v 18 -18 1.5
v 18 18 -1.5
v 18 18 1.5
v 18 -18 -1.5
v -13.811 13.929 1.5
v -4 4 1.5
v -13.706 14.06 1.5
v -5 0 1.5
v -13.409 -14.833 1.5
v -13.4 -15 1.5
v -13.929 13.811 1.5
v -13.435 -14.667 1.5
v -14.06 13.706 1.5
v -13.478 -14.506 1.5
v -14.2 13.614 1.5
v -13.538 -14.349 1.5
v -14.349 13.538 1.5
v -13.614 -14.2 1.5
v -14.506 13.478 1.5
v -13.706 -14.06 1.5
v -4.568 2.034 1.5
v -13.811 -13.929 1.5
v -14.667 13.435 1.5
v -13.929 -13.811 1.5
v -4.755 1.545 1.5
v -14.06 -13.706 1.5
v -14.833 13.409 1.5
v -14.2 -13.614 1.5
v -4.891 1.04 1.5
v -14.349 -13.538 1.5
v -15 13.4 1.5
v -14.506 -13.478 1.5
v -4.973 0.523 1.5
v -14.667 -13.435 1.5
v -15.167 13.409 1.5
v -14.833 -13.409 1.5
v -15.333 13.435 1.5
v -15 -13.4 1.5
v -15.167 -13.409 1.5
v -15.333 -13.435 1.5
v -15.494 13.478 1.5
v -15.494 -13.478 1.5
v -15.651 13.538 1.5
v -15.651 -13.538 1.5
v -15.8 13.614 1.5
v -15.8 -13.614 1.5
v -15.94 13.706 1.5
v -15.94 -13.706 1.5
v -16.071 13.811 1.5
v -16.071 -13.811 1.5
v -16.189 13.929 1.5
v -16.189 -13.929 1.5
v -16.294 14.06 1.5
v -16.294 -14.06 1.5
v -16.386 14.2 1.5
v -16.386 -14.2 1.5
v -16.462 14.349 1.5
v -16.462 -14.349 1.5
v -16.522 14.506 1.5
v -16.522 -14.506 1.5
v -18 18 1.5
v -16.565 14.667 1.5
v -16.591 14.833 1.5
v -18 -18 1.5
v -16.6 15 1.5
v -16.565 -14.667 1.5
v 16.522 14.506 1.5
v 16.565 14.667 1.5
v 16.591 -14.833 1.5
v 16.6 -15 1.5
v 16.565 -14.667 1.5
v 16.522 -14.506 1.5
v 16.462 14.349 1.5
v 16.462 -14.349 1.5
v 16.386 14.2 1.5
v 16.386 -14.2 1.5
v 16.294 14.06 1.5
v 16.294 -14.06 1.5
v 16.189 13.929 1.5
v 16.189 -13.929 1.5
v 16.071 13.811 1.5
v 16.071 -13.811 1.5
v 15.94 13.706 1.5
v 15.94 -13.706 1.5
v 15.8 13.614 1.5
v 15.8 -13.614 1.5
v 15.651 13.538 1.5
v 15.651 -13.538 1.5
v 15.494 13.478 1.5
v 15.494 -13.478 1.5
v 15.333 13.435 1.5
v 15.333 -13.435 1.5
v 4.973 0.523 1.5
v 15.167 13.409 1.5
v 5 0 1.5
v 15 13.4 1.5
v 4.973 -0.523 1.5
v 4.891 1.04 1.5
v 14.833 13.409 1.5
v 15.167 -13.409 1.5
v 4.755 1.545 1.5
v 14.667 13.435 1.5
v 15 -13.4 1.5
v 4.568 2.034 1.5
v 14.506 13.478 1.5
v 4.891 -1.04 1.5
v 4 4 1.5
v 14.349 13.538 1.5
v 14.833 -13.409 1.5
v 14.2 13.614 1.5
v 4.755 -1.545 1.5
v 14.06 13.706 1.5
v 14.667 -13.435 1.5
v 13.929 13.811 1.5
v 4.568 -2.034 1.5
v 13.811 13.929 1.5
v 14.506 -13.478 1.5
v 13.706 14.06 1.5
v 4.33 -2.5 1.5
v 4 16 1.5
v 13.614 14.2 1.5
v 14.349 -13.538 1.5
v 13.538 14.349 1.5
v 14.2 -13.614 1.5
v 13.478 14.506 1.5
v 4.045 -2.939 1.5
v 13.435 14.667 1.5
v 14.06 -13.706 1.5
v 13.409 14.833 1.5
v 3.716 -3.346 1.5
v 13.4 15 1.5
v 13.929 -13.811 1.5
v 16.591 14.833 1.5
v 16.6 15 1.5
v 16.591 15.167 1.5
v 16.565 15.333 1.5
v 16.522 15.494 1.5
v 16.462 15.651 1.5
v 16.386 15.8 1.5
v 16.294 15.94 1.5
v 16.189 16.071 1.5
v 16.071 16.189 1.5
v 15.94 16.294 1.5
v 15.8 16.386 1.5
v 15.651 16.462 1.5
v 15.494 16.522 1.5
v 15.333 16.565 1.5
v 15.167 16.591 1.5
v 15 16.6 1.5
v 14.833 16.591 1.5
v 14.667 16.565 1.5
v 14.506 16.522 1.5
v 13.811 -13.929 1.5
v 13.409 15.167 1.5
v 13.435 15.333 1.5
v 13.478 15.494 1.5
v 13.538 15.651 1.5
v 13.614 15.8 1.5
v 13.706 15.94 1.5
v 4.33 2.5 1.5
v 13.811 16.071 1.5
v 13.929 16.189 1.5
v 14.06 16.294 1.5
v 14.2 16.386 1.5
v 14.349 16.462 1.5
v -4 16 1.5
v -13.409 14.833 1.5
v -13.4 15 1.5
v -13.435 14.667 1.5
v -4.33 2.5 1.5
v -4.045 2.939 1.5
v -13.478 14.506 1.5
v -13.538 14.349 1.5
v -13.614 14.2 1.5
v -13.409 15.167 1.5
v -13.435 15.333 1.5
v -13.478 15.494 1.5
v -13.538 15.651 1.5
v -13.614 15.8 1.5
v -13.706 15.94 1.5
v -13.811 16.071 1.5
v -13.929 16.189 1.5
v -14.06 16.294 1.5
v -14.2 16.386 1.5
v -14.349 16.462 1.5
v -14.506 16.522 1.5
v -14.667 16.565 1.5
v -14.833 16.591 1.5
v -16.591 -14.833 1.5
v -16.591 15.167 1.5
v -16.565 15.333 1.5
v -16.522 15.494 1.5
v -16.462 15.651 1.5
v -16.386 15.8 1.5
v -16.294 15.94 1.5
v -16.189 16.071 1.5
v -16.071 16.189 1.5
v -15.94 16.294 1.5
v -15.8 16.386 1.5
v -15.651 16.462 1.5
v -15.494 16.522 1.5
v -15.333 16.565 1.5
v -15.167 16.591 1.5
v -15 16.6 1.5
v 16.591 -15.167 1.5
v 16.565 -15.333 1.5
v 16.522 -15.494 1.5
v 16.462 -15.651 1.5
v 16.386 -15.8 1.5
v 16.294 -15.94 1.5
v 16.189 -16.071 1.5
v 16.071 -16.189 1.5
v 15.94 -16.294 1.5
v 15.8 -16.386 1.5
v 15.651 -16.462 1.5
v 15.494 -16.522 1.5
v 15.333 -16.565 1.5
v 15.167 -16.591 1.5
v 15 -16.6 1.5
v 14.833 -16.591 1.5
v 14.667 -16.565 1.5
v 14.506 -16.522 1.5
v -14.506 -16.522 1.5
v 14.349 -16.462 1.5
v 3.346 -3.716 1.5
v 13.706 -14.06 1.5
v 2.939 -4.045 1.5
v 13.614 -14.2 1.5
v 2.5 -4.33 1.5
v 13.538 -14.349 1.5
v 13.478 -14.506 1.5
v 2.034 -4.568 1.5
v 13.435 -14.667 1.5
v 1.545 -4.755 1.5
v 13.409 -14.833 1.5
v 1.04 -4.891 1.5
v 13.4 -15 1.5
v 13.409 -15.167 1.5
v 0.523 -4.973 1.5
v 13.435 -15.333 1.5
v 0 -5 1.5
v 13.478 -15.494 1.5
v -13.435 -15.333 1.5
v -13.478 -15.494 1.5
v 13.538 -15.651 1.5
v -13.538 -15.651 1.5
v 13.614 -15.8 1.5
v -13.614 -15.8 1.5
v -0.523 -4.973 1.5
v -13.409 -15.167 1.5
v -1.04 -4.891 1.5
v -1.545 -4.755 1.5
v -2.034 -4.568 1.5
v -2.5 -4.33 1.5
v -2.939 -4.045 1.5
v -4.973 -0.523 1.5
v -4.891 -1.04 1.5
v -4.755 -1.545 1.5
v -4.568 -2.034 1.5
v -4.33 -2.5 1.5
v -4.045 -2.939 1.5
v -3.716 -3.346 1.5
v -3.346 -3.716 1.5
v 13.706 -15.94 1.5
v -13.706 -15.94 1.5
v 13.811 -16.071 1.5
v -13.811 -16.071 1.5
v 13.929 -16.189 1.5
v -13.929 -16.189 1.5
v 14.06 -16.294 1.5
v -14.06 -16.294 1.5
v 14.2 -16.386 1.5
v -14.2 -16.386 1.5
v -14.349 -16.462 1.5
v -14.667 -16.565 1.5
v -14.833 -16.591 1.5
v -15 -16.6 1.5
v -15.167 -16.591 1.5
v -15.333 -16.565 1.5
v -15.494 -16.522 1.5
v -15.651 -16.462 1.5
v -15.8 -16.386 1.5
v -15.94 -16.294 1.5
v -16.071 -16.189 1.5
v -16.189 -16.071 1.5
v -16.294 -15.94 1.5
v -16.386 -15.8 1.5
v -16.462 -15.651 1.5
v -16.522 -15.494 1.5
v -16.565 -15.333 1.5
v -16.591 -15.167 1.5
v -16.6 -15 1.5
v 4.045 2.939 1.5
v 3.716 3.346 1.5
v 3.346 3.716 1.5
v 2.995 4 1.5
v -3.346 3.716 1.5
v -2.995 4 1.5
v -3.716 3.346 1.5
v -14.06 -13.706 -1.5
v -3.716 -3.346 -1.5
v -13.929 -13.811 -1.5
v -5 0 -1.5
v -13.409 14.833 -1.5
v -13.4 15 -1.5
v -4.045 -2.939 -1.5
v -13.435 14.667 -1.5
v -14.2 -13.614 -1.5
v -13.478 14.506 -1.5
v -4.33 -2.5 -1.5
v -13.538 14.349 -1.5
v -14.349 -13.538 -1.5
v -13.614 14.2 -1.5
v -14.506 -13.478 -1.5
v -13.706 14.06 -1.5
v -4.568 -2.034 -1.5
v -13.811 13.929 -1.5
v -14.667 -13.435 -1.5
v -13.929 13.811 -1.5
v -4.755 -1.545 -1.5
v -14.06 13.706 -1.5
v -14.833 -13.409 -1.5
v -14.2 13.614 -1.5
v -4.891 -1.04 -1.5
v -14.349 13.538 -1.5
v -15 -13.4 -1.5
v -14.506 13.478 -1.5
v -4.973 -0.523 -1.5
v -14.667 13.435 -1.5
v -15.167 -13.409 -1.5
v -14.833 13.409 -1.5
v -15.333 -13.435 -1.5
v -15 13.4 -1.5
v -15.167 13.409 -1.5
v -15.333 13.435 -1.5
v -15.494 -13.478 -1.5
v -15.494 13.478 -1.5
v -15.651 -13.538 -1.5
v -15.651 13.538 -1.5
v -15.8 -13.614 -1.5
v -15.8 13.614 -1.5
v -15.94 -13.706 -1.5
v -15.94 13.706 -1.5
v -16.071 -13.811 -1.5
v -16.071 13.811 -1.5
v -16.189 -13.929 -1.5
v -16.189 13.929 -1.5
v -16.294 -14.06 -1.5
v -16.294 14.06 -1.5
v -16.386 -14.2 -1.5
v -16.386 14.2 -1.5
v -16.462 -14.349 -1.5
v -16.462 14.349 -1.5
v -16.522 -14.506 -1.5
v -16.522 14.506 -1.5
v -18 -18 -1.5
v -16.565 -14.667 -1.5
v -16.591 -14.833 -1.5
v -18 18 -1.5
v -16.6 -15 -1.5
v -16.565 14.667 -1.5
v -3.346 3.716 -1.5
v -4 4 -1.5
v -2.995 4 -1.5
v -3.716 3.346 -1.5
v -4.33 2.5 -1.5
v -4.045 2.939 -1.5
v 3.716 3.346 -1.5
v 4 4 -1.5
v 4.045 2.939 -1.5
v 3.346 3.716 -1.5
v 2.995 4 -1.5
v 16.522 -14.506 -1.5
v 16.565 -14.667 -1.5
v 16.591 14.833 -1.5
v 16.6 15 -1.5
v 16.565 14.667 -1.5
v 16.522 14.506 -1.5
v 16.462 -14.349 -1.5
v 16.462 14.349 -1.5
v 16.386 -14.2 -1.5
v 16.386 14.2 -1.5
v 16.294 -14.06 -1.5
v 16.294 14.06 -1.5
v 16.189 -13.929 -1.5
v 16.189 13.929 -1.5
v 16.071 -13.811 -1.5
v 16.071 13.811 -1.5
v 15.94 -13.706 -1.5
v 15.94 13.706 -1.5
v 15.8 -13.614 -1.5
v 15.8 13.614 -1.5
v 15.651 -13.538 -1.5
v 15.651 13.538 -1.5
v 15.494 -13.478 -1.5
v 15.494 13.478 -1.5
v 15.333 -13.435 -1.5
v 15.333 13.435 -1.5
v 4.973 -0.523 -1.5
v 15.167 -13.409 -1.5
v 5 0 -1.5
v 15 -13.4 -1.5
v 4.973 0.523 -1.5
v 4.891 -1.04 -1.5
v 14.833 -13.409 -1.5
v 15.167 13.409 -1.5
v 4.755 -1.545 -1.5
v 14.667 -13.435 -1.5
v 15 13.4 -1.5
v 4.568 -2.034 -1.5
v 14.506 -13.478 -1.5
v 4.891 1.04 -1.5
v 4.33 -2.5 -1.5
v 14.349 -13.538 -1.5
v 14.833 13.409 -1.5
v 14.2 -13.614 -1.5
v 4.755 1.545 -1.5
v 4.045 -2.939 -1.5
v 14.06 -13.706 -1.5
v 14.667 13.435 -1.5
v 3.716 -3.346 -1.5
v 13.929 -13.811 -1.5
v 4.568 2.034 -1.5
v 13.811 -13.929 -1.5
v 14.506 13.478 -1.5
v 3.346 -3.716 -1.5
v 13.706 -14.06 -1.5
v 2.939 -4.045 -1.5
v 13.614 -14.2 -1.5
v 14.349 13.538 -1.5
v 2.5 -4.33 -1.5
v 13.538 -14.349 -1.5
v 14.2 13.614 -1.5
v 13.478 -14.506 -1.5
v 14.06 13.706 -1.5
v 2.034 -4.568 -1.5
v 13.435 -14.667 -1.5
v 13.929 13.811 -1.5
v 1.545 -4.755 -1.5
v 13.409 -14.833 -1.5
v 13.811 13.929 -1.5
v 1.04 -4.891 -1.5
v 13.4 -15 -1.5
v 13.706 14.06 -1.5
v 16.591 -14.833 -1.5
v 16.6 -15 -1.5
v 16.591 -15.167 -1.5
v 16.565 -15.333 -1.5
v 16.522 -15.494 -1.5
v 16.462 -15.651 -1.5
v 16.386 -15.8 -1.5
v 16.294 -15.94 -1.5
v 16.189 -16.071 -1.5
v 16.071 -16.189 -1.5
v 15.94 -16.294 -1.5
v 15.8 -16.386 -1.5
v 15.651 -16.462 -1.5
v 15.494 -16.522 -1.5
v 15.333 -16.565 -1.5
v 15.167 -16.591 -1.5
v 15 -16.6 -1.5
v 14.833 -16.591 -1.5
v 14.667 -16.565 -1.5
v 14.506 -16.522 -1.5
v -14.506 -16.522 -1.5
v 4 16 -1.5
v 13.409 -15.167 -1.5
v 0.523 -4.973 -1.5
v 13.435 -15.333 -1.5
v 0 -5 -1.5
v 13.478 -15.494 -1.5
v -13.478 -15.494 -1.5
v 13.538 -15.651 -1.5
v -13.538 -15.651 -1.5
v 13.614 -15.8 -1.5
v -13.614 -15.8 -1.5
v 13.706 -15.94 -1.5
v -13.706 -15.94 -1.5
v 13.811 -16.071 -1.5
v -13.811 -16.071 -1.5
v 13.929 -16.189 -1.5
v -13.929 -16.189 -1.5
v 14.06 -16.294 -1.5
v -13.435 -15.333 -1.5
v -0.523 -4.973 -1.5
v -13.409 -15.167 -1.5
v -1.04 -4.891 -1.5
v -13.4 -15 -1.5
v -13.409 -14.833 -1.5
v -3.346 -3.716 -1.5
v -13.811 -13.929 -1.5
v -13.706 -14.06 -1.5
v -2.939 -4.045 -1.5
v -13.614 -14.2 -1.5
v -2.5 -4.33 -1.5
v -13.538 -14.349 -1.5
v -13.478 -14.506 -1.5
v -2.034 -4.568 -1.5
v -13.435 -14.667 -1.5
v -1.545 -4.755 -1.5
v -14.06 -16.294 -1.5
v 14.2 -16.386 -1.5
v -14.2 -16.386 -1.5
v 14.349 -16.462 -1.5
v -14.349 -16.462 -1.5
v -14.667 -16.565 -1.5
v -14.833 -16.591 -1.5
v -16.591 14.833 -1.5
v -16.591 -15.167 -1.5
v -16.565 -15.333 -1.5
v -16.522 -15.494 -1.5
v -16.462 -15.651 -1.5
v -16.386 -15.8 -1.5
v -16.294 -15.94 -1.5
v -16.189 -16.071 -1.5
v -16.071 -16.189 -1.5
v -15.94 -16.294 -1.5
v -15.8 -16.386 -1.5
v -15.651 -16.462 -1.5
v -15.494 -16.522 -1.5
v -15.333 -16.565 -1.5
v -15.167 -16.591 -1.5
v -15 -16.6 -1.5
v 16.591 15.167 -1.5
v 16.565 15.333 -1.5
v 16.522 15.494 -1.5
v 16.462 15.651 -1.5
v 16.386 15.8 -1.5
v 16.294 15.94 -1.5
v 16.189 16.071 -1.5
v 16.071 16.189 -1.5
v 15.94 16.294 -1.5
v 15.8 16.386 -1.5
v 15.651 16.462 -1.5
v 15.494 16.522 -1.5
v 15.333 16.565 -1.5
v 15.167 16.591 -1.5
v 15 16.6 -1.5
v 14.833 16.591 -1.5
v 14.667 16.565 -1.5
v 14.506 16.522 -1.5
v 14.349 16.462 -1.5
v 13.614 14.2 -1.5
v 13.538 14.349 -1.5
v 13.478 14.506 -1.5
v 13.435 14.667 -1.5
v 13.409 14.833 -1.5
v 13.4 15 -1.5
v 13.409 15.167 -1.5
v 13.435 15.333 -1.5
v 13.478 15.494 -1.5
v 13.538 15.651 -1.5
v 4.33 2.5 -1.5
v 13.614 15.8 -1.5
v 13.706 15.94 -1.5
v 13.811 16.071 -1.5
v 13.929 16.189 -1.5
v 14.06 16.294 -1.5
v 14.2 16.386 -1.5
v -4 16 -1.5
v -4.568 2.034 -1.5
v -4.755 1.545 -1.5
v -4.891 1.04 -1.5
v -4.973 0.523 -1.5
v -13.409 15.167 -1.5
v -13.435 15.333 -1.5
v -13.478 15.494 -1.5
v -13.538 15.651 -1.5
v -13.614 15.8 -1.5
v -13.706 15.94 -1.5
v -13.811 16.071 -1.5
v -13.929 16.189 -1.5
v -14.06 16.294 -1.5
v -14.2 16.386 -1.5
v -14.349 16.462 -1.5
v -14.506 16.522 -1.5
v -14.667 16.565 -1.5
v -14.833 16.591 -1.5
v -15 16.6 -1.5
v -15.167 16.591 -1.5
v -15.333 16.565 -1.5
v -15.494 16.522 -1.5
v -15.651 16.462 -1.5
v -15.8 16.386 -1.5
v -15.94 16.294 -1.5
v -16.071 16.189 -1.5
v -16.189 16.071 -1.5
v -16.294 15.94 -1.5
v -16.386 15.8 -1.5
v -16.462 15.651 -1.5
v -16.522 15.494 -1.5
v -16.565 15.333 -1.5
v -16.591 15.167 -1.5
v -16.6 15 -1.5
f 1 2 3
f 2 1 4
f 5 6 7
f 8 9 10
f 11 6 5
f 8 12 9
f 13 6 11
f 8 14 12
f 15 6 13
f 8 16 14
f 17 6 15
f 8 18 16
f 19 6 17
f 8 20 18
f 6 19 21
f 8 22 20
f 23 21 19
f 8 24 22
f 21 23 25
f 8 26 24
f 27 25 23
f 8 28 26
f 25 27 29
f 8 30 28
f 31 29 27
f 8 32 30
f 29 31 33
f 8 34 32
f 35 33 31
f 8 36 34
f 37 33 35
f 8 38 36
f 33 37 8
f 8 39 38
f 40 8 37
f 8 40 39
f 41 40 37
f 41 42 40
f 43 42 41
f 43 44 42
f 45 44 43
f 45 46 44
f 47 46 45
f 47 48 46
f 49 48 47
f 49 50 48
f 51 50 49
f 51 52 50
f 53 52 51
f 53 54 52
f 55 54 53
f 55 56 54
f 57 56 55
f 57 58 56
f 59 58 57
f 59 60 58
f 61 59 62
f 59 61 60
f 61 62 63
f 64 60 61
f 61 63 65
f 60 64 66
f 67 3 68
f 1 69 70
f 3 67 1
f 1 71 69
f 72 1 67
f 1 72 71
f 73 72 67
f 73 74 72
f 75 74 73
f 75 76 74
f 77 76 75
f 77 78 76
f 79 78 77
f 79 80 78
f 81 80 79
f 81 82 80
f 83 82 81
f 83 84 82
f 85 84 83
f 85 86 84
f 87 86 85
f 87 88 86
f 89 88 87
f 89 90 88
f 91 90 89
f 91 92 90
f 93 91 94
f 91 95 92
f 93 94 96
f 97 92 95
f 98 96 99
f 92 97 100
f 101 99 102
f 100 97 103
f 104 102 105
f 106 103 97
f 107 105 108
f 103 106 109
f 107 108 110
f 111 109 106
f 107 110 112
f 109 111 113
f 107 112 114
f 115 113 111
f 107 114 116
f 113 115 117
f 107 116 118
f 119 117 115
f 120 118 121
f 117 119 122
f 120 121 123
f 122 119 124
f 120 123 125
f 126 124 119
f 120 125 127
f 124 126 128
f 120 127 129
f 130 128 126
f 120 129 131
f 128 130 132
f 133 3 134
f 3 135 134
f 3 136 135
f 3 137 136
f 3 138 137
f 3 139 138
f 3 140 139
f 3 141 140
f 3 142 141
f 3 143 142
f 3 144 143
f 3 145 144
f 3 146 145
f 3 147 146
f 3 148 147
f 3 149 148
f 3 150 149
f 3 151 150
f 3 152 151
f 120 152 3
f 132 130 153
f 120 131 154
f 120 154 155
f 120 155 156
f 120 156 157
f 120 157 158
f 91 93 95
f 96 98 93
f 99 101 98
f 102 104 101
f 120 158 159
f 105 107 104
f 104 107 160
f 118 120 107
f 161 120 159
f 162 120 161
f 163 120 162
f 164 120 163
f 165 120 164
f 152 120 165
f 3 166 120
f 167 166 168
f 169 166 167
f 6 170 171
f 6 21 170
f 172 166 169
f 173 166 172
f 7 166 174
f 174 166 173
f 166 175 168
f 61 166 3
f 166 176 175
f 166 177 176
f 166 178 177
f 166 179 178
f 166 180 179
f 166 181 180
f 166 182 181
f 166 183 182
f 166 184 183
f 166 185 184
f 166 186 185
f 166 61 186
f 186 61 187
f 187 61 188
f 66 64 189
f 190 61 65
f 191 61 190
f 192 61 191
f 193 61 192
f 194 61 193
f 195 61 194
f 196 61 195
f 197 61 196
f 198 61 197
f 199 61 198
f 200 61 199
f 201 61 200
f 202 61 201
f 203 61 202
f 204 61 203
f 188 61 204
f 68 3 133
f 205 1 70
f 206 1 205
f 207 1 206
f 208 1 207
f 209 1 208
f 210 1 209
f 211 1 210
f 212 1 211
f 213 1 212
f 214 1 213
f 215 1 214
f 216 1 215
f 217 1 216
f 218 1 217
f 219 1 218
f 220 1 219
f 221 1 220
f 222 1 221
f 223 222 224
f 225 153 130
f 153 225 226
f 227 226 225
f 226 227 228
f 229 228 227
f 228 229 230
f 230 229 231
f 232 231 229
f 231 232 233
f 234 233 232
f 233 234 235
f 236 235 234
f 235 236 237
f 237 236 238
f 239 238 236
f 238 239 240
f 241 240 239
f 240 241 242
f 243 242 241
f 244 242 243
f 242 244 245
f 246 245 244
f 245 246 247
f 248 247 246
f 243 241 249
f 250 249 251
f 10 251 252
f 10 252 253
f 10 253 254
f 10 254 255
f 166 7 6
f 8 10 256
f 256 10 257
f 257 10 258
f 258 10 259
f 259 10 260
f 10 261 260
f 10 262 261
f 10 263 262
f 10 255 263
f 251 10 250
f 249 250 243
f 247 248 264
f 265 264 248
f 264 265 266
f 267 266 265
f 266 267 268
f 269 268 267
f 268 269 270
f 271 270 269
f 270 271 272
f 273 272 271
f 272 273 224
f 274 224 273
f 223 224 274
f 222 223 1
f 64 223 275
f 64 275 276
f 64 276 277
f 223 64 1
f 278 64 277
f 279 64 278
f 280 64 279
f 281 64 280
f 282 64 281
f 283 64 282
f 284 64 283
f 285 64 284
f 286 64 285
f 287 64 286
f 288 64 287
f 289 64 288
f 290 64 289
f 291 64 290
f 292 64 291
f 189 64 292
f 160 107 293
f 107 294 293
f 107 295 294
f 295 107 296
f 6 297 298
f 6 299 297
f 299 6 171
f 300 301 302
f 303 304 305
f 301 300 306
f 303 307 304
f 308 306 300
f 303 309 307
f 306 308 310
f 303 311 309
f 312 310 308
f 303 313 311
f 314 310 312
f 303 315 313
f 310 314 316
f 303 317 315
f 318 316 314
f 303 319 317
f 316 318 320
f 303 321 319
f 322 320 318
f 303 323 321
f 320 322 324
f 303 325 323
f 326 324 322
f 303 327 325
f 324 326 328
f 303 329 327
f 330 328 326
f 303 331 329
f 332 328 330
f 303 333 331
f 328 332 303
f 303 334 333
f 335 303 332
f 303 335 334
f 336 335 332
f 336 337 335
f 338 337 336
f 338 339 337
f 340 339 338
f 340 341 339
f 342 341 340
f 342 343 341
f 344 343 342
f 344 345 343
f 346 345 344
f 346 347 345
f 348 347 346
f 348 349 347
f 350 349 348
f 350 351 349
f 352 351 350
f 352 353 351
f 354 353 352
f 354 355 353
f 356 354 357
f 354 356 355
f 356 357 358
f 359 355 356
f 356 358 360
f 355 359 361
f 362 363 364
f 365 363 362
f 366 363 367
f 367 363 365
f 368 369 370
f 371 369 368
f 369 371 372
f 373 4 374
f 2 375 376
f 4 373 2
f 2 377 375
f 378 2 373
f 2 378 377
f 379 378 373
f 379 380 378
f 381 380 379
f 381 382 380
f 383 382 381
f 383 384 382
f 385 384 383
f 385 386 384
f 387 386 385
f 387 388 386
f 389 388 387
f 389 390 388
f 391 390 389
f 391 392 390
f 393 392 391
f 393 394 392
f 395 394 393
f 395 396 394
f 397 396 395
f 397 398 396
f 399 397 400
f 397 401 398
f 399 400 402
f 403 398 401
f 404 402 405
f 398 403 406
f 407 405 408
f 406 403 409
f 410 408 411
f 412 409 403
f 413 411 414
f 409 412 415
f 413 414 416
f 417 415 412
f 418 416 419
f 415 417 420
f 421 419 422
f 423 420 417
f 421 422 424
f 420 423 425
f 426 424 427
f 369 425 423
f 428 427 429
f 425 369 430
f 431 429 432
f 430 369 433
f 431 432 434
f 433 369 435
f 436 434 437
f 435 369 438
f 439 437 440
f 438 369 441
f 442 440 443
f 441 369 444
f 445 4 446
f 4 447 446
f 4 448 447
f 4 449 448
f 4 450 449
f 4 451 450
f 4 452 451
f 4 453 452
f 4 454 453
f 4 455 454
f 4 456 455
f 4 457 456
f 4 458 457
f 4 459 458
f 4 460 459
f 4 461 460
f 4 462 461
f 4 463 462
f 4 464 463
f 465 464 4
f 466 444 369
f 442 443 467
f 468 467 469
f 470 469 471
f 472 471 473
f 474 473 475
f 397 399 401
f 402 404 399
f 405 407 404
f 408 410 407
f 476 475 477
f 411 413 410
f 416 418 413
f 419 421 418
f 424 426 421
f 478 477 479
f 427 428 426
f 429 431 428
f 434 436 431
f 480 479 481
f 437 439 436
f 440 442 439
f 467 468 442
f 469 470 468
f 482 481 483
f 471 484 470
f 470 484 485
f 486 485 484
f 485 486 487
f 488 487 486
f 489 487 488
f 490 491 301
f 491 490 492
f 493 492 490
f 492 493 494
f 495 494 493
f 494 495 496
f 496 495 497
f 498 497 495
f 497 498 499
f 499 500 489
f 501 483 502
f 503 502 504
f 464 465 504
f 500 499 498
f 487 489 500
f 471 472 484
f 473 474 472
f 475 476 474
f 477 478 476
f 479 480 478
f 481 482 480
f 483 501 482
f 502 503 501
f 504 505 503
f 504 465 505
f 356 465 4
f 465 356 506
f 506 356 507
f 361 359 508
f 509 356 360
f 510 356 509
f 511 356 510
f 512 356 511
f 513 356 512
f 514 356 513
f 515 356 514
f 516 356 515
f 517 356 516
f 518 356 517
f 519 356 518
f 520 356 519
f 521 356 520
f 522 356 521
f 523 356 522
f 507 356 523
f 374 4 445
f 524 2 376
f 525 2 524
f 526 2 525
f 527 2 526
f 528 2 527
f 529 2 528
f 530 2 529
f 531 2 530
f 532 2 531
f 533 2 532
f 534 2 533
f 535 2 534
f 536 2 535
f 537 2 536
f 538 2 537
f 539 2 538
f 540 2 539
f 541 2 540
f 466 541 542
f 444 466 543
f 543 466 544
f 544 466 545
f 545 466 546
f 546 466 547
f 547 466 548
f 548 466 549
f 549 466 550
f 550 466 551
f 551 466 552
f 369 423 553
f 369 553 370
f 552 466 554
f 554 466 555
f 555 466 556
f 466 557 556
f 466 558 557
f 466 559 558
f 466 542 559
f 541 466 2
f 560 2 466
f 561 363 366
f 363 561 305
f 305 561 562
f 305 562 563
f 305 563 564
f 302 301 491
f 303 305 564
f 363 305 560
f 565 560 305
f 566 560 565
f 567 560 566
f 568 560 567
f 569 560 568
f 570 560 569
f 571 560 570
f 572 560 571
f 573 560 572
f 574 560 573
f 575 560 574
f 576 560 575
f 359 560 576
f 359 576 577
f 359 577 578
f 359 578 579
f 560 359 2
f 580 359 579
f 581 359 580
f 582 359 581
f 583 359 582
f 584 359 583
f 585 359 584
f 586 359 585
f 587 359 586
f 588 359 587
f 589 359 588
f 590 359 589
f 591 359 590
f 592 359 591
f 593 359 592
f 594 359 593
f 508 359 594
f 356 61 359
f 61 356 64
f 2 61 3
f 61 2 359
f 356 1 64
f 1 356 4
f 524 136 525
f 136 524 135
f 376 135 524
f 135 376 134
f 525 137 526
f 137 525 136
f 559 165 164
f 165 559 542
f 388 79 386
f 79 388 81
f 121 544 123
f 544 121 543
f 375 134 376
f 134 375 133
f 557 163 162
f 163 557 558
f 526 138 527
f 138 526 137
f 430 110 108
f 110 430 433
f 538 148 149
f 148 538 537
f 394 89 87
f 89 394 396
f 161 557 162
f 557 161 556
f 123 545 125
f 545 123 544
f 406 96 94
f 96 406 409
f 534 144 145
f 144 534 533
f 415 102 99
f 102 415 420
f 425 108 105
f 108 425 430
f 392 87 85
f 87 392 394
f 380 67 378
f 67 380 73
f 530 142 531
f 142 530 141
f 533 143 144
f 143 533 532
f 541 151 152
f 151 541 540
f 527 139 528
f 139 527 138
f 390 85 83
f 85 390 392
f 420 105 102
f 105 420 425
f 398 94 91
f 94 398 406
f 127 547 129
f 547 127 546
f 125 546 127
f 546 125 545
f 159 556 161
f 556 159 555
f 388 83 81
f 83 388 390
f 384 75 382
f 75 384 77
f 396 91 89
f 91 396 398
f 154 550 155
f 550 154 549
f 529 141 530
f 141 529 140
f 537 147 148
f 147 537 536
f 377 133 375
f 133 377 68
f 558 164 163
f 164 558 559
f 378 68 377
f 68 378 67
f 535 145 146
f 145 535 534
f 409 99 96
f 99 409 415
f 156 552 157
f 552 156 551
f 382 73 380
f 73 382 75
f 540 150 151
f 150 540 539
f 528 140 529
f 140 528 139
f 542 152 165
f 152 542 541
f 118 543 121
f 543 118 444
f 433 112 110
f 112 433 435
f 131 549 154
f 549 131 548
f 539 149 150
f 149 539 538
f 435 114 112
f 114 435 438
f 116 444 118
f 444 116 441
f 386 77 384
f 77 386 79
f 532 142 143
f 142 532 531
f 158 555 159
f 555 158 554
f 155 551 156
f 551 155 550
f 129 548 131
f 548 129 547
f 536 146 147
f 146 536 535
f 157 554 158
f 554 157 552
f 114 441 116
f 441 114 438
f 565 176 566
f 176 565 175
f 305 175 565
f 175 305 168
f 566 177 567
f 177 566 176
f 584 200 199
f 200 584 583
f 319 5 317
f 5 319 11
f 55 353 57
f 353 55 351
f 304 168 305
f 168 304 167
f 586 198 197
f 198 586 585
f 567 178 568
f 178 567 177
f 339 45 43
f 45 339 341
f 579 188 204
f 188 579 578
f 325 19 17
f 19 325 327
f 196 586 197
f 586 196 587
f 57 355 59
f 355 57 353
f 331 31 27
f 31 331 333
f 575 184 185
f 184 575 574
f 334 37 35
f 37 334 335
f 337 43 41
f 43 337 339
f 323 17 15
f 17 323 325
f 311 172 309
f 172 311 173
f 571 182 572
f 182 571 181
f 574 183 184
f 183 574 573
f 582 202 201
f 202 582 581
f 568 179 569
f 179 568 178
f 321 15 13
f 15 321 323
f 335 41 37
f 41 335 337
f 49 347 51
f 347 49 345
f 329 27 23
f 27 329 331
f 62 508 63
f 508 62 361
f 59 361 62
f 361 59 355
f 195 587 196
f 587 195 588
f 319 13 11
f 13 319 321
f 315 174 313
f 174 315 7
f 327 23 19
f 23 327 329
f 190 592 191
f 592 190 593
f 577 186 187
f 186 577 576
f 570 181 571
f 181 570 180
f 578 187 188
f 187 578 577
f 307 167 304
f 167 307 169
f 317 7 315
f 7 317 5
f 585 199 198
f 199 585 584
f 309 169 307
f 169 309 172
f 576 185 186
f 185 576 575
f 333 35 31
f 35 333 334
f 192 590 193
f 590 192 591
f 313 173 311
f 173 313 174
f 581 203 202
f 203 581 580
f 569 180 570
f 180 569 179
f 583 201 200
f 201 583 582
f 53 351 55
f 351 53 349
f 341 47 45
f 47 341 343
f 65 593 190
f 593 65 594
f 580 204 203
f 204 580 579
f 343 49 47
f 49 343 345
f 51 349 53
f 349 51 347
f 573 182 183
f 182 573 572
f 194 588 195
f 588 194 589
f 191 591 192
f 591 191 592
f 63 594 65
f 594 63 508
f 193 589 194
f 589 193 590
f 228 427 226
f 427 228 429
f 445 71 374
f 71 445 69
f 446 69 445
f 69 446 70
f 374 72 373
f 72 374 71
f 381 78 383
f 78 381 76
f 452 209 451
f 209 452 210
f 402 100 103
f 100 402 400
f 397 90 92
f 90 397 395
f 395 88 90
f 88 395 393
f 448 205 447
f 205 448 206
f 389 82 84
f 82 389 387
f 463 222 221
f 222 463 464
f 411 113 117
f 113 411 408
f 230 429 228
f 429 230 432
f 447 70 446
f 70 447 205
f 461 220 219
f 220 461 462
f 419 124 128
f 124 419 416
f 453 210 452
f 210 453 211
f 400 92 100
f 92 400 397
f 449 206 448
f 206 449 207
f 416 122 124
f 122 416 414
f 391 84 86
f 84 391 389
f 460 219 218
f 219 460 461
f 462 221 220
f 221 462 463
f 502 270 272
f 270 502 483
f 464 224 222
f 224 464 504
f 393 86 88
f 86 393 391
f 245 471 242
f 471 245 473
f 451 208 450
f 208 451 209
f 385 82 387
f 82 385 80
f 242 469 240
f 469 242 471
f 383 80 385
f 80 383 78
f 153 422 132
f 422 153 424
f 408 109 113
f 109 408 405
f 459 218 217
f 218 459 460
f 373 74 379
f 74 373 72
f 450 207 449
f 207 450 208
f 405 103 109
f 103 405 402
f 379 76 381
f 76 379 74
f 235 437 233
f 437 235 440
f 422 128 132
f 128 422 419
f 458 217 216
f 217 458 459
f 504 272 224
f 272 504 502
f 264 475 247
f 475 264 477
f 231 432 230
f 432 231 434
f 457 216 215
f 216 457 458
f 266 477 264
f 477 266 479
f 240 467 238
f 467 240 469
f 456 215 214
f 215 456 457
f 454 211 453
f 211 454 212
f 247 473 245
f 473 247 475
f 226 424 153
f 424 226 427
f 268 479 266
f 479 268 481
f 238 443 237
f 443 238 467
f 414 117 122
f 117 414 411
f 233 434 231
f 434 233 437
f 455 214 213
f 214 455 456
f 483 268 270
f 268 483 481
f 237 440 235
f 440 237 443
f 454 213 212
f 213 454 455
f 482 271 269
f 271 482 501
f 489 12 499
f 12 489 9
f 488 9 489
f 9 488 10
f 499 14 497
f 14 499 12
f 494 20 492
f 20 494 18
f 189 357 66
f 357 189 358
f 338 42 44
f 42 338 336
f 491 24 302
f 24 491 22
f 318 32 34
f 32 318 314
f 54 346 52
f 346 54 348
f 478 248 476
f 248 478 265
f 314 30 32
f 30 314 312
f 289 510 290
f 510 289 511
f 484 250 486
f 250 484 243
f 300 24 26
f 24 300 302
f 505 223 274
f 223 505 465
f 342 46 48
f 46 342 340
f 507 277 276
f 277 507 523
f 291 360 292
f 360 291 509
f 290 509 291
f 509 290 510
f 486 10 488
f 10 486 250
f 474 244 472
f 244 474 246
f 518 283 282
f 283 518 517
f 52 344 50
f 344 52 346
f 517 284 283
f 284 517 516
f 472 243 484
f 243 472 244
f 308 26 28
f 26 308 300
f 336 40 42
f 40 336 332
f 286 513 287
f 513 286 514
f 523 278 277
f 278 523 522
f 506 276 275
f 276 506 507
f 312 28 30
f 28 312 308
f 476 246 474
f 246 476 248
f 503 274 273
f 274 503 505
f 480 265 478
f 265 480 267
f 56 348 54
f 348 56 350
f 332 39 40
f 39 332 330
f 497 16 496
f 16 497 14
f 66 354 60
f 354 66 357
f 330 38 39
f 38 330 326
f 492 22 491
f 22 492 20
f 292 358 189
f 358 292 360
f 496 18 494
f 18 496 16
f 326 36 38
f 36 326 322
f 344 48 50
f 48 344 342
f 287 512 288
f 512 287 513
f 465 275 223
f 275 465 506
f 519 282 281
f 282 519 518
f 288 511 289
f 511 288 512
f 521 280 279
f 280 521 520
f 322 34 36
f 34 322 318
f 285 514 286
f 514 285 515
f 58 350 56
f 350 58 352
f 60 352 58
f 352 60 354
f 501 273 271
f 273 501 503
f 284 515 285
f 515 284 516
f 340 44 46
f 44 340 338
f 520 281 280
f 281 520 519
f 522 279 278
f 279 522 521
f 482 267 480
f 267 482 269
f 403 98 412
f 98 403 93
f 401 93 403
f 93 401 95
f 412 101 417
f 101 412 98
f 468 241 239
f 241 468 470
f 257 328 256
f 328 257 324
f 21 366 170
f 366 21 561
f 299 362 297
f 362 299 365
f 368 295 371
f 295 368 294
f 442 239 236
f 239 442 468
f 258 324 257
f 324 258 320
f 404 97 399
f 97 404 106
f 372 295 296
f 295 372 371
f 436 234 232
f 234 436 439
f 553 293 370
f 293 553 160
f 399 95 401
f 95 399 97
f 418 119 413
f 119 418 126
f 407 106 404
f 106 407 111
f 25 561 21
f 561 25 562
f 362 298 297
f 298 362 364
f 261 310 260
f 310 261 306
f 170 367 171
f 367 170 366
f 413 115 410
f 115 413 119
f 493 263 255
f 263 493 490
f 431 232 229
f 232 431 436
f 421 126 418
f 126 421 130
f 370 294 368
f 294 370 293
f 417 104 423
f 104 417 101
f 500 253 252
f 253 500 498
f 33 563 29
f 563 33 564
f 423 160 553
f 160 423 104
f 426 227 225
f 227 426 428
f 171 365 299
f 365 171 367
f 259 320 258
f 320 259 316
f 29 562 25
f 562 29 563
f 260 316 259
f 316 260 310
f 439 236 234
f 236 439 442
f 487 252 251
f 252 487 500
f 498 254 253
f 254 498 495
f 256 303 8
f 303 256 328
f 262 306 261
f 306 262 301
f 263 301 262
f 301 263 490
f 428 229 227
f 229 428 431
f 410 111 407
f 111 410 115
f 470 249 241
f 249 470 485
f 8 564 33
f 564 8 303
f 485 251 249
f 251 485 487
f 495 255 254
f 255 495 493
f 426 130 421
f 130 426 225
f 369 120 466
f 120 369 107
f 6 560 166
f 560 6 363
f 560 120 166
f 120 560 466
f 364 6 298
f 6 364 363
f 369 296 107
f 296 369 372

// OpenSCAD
// AeroMesh S3 - Nadir Camera & VL53L0X LiDAR Mount
// Material: PLA / PETG / TPU
// Platform: 36x36mm Mark4 Bottom Plate Mount

$fn = 60;

plate_width = 36;
plate_length = 36;
plate_thickness = 3;
m3_hole_r = 1.6;

difference() {
    cube([plate_width, plate_length, plate_thickness], center = true);

    translate([15, 15, 0]) cylinder(h = plate_thickness +2, r = m3_hole_r, center = true);
    translate([-15, 15, 0]) cylinder(h = plate_thickness +2, r = m3_hole_r, center = true);
    translate([15, -15, 0]) cylinder(h = plate_thickness + 2, r = m3_hole_r, center = true);
    translate([-15, -15, 0]) cylinder(h = plate_thickness + 2, r = m3_hole_r, center = true);

    cylinder(h = plate_thickness +2, r = 5.0, center = true);

    translate([0, 10, 0]) cube([8, 12, plate_thickness +2], center = true);


}
